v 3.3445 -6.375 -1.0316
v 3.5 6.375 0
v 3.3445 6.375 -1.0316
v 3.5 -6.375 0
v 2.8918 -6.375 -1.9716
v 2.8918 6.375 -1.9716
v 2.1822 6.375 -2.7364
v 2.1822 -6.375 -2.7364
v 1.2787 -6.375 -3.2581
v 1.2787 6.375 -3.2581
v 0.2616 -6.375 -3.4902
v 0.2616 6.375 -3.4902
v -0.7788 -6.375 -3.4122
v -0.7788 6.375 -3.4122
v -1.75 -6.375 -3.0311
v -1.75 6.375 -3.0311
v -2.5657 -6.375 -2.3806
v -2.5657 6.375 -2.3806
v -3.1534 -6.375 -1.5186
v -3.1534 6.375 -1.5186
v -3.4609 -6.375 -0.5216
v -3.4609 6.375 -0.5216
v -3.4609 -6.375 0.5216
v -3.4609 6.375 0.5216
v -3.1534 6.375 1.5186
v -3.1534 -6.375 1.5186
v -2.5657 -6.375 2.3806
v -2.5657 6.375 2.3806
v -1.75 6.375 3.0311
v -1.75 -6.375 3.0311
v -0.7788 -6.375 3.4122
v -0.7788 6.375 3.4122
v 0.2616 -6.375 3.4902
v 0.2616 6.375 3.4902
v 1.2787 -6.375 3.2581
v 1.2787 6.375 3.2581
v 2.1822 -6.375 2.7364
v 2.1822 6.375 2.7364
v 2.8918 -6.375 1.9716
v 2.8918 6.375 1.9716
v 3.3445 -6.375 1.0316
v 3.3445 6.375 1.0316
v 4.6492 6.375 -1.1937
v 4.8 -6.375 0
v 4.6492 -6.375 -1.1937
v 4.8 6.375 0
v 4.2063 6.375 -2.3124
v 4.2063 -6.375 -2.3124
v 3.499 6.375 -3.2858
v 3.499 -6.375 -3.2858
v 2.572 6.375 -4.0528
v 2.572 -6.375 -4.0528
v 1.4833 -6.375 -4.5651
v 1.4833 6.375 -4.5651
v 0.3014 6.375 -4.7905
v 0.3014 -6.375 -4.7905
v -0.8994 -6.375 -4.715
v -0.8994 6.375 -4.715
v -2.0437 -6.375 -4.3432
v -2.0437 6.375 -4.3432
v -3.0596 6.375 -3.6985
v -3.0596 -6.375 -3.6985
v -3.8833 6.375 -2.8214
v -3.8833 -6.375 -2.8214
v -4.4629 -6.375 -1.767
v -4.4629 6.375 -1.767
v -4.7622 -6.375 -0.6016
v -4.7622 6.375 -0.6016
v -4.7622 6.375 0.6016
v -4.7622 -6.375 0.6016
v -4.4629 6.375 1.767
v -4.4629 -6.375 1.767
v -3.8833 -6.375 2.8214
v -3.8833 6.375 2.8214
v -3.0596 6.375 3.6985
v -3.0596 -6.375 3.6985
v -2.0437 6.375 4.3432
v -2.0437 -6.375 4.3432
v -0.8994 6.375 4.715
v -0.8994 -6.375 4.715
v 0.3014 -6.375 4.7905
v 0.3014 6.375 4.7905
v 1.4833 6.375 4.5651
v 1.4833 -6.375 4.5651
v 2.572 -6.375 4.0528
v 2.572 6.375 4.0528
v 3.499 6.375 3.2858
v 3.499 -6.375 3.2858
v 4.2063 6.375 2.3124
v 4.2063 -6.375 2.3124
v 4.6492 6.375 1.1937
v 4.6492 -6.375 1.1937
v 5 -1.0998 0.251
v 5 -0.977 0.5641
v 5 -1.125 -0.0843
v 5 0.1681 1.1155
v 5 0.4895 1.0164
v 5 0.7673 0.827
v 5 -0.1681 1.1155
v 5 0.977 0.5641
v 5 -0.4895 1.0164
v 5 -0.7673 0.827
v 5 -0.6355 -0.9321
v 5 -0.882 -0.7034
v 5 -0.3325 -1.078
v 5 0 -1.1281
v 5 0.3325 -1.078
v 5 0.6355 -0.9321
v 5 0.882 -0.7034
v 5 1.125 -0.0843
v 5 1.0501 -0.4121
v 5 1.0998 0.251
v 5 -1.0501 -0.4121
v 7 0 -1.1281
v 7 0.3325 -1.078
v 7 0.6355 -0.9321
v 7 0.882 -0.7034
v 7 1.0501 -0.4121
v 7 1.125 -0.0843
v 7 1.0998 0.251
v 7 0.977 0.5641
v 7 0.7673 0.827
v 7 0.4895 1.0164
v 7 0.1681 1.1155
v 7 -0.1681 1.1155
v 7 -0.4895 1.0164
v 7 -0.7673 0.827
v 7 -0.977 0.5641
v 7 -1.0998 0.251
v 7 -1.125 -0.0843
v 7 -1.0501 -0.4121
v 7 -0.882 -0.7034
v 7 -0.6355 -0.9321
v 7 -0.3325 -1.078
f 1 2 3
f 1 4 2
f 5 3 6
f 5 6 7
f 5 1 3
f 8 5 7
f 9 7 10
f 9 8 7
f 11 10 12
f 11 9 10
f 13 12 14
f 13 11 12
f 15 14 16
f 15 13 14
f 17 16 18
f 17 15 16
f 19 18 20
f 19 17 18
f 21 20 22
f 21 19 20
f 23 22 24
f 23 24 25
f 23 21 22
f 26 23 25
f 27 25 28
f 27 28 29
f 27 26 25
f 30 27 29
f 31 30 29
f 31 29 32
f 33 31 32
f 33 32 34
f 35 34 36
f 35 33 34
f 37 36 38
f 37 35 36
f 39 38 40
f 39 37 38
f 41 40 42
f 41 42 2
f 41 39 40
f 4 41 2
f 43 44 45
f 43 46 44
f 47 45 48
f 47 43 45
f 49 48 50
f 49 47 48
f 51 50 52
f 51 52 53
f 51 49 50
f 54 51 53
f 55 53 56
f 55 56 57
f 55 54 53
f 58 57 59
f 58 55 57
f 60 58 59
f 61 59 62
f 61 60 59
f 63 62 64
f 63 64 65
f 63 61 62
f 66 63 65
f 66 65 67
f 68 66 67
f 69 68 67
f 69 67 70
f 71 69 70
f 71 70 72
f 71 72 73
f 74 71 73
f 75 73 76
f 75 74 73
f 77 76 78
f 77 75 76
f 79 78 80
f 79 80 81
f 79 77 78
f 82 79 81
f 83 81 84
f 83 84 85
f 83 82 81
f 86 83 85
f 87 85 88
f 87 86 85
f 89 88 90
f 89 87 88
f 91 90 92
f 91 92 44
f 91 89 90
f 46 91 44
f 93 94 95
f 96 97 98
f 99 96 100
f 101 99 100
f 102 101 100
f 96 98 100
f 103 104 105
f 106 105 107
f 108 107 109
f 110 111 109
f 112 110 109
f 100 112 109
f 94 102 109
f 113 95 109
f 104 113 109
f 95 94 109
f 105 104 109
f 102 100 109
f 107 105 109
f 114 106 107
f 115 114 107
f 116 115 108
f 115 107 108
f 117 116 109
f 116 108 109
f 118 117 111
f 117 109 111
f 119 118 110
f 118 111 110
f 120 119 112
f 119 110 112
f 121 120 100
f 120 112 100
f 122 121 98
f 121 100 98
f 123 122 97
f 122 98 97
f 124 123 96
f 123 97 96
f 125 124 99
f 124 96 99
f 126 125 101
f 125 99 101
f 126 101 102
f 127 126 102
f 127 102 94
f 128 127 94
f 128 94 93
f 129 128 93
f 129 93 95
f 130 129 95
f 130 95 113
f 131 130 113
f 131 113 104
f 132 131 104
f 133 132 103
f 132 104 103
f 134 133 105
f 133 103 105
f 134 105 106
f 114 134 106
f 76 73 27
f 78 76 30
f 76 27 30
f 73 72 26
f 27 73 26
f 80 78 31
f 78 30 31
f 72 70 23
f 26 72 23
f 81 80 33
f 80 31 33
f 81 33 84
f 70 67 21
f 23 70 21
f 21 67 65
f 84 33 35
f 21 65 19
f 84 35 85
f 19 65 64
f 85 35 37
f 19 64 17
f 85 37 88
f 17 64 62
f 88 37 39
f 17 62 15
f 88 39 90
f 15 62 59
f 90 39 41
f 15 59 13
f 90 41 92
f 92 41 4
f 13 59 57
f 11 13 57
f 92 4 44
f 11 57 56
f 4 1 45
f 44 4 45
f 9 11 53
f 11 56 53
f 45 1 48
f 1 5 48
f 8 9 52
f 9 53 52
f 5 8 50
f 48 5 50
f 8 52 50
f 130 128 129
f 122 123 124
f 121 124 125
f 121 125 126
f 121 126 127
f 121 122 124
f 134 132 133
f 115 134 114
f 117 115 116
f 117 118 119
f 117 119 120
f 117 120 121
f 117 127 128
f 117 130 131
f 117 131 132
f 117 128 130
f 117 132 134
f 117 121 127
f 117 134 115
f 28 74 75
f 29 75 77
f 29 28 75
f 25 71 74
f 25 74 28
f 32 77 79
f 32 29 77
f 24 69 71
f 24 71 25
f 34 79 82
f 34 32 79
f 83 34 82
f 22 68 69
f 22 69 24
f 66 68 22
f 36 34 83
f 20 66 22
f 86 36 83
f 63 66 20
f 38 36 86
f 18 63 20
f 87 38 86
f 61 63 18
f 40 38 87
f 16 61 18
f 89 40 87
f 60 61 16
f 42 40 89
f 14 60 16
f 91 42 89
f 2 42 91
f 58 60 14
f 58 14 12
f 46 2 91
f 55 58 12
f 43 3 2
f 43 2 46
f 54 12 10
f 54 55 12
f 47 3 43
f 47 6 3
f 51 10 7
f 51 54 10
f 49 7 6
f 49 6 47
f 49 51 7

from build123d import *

# Parameters (mm, degrees)
SKETCH1_R           = 4.8
SKETCH1_R_2         = 3.5
BOSS_EXTRUDE1_DEPTH = 6.375
BOSS_EXTRUDE2_START = 5
SKETCH2_R           = 1.128123291
BOSS_EXTRUDE2_DEPTH = 2


with BuildPart() as part:
    # Sketch1 → Boss-Extrude1 (new body, symmetric)
    with BuildSketch(Plane(origin=(0, 0, 0), x_dir=(1, 0, 0), z_dir=(0, 1, 0))):
        Circle(SKETCH1_R)
        Circle(SKETCH1_R_2, mode=Mode.SUBTRACT)
    extrude(amount=BOSS_EXTRUDE1_DEPTH, both=True)


with BuildPart() as body_2:
    # Sketch2 → Boss-Extrude2 (new body)
    with BuildSketch(Plane(origin=(0, 0, 0), x_dir=(0, 0, -1), z_dir=(1, 0, 0)).offset(BOSS_EXTRUDE2_START)):
        Circle(SKETCH2_R)
    extrude(amount=BOSS_EXTRUDE2_DEPTH)


solid = Compound([part.part, body_2.part])
